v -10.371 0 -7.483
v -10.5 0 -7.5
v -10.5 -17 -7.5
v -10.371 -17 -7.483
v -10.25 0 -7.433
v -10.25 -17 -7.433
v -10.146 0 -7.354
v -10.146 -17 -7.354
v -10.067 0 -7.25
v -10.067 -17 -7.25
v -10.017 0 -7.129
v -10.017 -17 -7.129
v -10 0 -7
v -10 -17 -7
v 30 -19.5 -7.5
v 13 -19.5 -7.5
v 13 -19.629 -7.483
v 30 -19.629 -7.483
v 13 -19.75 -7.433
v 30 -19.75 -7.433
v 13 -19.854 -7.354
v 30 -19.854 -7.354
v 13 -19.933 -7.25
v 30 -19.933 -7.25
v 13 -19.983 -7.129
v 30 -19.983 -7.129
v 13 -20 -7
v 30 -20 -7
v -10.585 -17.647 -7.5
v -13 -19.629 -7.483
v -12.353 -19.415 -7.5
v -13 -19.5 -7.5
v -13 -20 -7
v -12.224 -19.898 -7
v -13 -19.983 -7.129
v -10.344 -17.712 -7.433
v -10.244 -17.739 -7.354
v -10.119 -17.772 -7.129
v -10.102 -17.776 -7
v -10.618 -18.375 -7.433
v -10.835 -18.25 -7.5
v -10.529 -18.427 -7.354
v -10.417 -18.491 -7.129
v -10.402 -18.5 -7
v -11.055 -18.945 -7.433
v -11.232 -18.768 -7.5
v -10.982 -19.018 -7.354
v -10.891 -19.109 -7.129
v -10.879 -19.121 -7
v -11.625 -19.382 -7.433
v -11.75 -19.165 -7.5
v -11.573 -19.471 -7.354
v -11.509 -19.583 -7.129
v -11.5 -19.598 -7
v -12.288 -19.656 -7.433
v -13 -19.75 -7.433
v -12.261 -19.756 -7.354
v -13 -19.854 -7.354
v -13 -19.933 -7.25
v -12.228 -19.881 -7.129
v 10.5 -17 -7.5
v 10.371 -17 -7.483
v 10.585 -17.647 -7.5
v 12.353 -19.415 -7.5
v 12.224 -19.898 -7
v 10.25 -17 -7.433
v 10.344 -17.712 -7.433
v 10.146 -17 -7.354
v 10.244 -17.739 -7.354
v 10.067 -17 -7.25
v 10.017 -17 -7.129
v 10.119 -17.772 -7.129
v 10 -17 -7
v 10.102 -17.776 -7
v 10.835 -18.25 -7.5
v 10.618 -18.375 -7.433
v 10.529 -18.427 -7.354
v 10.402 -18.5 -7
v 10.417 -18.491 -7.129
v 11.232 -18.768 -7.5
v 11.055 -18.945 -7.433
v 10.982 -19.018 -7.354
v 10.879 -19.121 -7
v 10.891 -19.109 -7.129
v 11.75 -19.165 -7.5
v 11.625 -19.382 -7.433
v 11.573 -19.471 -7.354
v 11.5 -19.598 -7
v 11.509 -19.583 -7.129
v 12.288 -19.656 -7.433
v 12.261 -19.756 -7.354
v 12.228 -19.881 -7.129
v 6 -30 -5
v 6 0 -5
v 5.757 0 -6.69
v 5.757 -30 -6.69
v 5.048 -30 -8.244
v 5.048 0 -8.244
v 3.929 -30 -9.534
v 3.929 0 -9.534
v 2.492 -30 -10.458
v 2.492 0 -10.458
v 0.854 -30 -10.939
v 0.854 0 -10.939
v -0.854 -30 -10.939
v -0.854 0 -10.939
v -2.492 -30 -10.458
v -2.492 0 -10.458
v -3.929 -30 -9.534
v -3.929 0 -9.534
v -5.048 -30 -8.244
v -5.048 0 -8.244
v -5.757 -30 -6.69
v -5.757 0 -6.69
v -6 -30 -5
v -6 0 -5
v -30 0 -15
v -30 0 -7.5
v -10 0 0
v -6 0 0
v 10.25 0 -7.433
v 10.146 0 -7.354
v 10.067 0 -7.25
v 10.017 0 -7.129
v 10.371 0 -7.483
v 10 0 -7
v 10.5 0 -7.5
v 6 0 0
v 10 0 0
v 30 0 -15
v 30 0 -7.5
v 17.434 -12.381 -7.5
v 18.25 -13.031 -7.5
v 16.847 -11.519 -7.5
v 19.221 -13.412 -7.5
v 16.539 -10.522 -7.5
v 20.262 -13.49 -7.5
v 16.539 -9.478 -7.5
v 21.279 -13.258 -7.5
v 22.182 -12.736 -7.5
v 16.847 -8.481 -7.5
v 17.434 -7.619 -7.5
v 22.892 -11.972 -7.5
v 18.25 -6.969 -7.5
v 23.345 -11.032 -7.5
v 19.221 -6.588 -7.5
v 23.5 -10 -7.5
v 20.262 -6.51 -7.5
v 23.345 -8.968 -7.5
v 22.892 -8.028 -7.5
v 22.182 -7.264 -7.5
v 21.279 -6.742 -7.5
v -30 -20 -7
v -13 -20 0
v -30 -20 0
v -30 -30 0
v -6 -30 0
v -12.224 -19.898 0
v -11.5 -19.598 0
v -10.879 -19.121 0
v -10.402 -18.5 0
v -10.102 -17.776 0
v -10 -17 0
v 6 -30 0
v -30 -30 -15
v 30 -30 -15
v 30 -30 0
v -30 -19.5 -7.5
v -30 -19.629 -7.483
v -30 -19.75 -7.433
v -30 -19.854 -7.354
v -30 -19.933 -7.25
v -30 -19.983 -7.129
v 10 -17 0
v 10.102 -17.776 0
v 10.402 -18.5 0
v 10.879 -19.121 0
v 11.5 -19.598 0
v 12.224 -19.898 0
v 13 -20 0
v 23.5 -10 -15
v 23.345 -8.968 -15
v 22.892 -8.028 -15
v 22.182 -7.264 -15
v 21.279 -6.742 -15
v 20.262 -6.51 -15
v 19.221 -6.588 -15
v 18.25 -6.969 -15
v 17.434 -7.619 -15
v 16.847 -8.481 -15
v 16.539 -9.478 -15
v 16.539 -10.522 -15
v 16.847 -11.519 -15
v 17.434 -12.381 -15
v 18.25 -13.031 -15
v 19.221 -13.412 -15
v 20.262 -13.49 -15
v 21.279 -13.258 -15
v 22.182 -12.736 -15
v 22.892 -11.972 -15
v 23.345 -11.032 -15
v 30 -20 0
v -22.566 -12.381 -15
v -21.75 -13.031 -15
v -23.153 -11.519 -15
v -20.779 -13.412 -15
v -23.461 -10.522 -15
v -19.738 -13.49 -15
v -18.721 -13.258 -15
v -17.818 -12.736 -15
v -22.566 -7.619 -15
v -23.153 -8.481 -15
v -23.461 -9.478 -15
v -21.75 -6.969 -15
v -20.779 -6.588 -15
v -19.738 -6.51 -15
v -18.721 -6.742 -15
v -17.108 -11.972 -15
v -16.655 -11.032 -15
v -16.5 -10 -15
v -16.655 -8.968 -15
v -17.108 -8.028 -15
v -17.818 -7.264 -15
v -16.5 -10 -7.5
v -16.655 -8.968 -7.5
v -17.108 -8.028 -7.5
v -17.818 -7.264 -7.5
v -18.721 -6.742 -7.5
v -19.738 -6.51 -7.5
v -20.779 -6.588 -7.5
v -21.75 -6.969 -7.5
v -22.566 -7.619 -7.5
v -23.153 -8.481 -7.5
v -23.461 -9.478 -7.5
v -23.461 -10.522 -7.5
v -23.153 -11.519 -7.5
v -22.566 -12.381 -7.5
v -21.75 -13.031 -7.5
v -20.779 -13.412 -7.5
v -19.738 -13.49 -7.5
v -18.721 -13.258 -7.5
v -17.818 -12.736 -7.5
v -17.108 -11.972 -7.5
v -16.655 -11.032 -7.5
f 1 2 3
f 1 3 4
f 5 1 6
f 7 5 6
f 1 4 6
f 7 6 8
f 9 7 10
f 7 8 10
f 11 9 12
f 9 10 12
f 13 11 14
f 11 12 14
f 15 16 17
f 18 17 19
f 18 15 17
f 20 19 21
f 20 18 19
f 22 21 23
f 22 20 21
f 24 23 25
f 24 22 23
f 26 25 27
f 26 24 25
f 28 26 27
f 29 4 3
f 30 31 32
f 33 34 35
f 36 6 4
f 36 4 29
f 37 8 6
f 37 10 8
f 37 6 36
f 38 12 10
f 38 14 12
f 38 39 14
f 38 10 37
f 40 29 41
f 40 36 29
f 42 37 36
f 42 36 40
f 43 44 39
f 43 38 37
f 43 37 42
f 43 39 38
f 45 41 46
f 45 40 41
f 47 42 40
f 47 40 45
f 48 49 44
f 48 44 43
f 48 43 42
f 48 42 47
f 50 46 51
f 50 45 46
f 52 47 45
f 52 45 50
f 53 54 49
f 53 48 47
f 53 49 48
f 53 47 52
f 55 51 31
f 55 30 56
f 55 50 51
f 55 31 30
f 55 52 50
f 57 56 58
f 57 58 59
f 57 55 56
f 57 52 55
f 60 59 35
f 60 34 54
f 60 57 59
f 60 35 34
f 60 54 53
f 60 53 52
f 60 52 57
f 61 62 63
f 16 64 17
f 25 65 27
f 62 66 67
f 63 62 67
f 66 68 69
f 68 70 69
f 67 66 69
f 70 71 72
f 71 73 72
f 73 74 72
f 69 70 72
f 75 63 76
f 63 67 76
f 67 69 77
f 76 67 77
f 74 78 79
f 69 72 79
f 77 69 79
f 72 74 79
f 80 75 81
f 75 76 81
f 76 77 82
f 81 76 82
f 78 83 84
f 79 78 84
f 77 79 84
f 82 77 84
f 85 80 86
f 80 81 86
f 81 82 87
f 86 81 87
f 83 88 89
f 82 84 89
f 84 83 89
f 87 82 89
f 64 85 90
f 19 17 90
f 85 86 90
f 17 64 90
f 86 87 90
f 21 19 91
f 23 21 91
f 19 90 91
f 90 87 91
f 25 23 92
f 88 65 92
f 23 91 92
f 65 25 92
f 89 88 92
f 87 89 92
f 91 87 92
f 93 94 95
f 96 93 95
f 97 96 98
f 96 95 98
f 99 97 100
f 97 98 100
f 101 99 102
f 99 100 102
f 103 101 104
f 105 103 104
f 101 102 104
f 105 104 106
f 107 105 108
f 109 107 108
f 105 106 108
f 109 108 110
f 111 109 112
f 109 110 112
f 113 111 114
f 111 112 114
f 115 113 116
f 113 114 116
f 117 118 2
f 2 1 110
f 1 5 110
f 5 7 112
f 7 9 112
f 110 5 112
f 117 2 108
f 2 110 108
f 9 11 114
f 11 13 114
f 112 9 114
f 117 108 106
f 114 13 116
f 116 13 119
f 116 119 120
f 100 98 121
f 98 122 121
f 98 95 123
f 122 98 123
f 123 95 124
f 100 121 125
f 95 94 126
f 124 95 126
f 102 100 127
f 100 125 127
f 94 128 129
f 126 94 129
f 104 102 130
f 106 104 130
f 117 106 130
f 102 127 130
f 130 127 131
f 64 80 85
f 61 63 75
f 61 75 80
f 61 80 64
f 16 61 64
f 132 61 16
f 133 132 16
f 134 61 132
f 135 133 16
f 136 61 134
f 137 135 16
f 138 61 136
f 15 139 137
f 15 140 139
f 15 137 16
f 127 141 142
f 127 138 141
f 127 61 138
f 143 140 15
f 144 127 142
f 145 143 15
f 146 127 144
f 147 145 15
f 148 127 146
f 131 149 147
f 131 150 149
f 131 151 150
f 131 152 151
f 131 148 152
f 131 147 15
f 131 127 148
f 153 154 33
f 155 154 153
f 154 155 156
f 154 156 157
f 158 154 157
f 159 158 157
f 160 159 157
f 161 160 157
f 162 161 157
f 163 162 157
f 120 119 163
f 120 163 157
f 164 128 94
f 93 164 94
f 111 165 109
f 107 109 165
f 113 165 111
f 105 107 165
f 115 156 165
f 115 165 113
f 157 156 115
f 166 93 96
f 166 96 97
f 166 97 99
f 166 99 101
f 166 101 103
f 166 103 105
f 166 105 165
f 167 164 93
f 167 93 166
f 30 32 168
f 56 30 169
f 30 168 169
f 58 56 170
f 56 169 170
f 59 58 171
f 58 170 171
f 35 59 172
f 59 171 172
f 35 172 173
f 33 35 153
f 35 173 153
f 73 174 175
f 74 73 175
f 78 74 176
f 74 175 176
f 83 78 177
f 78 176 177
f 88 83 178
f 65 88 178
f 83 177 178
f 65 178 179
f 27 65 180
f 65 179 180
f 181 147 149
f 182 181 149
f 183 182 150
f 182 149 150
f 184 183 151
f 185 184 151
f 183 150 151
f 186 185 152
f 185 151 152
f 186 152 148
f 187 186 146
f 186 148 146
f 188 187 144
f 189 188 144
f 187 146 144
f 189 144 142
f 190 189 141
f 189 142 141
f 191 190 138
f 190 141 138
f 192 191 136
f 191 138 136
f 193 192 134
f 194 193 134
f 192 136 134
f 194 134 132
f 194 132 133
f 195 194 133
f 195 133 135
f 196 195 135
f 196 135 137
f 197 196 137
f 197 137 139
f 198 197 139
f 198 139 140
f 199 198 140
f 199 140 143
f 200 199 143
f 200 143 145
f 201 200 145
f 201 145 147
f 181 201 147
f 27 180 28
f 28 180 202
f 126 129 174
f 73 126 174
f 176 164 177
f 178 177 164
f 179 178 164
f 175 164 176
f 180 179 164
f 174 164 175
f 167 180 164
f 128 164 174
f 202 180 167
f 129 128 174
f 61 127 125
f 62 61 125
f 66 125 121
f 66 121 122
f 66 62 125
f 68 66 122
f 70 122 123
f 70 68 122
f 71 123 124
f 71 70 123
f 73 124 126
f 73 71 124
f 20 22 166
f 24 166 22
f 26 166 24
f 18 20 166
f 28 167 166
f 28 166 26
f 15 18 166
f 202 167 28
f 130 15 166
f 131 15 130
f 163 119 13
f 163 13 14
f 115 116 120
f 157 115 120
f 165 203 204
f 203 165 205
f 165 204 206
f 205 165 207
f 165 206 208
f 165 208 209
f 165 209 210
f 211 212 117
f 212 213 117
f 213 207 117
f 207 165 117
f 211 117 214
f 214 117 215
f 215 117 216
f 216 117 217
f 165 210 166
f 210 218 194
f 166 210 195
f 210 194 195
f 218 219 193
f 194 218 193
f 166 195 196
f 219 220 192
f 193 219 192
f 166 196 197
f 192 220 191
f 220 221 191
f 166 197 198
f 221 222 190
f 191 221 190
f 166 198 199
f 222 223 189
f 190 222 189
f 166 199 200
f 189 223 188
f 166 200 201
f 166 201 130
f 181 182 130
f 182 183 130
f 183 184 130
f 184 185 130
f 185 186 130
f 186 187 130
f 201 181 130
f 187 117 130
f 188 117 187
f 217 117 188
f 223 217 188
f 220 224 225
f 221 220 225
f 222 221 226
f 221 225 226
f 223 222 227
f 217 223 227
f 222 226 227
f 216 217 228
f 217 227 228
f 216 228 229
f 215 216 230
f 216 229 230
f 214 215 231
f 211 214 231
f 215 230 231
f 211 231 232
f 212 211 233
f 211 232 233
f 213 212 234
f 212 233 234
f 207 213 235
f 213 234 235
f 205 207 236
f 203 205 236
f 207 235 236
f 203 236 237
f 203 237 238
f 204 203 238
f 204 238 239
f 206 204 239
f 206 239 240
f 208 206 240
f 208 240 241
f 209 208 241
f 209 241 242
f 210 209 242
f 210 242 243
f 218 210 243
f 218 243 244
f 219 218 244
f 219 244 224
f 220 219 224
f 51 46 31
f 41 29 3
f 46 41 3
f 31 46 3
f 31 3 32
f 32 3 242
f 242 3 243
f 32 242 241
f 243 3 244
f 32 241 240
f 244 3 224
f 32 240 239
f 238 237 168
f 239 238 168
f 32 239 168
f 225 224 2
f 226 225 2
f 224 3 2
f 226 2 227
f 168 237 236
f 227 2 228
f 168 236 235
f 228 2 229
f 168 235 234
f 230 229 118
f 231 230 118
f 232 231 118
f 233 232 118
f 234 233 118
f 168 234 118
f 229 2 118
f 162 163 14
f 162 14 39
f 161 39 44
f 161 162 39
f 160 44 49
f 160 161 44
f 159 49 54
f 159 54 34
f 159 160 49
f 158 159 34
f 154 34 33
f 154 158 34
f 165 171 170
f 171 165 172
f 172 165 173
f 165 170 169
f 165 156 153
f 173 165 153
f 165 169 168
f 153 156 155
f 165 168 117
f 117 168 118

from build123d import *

# Parameters (mm, degrees)
SKETCH1_W      = 60
SKETCH1_H      = 30
SKETCH1_R      = 3.5
EXTRUDE1_DEPTH = 15
EXTRUDE2_DEPTH = 7.5
EXTRUDE3_DEPTH = 31
FILLET1_R      = 0.5


with BuildPart() as part:
    # Sketch1 → Extrude1 (new body)
    with BuildSketch(Plane.XY):
        with Locations((0, -15)):
            Rectangle(SKETCH1_W, SKETCH1_H)
        with Locations((20, -10)):
            Circle(SKETCH1_R, mode=Mode.SUBTRACT)
        with Locations((-20, -10)):
            Circle(SKETCH1_R, mode=Mode.SUBTRACT)
    extrude(amount=-EXTRUDE1_DEPTH)

    # Sketch2 → Extrude2 (cut)
    with BuildSketch(Plane.XY):
        with BuildLine():
            Line((13, -20), (30, -20))
            Line((30, -20), (30, 0))
            Line((30, 0), (10, 0))
            Line((10, 0), (10, -17))
            ThreePointArc((10, -17), (10.878679656, -19.121320344), (13, -20))
        make_face()
        with BuildLine():
            Line((-30, -20), (-30, 0))
            Line((-30, 0), (-10, 0))
            Line((-10, 0), (-10, -17))
            ThreePointArc((-10, -17), (-10.878679656, -19.121320344), (-13, -20))
            Line((-13, -20), (-30, -20))
        make_face()
    extrude(amount=-EXTRUDE2_DEPTH, mode=Mode.SUBTRACT)

    # Sketch3 → Extrude3 (cut, through all)
    with BuildSketch(Plane(origin=(0, 0, 0), x_dir=(1, 0, 0), z_dir=(0, 1, 0))):
        with BuildLine():
            Line((6, 0), (6, 5))
            ThreePointArc((6, 5), (0, 11), (-6, 5))
            Line((-6, 5), (-6, 0))
            Line((-6, 0), (6, 0))
        make_face()
    extrude(amount=-EXTRUDE3_DEPTH, mode=Mode.SUBTRACT)

    # Fillet1
    fillet1_edges = [part.edges().sort_by_distance(p)[0] for p in [
        (21.5, -20, -7.5),
        (10.878679656, -19.121320344, -7.5),
        (10, -8.5, -7.5),
        (-10.878679656, -19.121320344, -7.5),
        (-21.5, -20, -7.5),
        (-10, -8.5, -7.5),
    ]]
    fillet(fillet1_edges, radius=FILLET1_R)


solid = part.part
